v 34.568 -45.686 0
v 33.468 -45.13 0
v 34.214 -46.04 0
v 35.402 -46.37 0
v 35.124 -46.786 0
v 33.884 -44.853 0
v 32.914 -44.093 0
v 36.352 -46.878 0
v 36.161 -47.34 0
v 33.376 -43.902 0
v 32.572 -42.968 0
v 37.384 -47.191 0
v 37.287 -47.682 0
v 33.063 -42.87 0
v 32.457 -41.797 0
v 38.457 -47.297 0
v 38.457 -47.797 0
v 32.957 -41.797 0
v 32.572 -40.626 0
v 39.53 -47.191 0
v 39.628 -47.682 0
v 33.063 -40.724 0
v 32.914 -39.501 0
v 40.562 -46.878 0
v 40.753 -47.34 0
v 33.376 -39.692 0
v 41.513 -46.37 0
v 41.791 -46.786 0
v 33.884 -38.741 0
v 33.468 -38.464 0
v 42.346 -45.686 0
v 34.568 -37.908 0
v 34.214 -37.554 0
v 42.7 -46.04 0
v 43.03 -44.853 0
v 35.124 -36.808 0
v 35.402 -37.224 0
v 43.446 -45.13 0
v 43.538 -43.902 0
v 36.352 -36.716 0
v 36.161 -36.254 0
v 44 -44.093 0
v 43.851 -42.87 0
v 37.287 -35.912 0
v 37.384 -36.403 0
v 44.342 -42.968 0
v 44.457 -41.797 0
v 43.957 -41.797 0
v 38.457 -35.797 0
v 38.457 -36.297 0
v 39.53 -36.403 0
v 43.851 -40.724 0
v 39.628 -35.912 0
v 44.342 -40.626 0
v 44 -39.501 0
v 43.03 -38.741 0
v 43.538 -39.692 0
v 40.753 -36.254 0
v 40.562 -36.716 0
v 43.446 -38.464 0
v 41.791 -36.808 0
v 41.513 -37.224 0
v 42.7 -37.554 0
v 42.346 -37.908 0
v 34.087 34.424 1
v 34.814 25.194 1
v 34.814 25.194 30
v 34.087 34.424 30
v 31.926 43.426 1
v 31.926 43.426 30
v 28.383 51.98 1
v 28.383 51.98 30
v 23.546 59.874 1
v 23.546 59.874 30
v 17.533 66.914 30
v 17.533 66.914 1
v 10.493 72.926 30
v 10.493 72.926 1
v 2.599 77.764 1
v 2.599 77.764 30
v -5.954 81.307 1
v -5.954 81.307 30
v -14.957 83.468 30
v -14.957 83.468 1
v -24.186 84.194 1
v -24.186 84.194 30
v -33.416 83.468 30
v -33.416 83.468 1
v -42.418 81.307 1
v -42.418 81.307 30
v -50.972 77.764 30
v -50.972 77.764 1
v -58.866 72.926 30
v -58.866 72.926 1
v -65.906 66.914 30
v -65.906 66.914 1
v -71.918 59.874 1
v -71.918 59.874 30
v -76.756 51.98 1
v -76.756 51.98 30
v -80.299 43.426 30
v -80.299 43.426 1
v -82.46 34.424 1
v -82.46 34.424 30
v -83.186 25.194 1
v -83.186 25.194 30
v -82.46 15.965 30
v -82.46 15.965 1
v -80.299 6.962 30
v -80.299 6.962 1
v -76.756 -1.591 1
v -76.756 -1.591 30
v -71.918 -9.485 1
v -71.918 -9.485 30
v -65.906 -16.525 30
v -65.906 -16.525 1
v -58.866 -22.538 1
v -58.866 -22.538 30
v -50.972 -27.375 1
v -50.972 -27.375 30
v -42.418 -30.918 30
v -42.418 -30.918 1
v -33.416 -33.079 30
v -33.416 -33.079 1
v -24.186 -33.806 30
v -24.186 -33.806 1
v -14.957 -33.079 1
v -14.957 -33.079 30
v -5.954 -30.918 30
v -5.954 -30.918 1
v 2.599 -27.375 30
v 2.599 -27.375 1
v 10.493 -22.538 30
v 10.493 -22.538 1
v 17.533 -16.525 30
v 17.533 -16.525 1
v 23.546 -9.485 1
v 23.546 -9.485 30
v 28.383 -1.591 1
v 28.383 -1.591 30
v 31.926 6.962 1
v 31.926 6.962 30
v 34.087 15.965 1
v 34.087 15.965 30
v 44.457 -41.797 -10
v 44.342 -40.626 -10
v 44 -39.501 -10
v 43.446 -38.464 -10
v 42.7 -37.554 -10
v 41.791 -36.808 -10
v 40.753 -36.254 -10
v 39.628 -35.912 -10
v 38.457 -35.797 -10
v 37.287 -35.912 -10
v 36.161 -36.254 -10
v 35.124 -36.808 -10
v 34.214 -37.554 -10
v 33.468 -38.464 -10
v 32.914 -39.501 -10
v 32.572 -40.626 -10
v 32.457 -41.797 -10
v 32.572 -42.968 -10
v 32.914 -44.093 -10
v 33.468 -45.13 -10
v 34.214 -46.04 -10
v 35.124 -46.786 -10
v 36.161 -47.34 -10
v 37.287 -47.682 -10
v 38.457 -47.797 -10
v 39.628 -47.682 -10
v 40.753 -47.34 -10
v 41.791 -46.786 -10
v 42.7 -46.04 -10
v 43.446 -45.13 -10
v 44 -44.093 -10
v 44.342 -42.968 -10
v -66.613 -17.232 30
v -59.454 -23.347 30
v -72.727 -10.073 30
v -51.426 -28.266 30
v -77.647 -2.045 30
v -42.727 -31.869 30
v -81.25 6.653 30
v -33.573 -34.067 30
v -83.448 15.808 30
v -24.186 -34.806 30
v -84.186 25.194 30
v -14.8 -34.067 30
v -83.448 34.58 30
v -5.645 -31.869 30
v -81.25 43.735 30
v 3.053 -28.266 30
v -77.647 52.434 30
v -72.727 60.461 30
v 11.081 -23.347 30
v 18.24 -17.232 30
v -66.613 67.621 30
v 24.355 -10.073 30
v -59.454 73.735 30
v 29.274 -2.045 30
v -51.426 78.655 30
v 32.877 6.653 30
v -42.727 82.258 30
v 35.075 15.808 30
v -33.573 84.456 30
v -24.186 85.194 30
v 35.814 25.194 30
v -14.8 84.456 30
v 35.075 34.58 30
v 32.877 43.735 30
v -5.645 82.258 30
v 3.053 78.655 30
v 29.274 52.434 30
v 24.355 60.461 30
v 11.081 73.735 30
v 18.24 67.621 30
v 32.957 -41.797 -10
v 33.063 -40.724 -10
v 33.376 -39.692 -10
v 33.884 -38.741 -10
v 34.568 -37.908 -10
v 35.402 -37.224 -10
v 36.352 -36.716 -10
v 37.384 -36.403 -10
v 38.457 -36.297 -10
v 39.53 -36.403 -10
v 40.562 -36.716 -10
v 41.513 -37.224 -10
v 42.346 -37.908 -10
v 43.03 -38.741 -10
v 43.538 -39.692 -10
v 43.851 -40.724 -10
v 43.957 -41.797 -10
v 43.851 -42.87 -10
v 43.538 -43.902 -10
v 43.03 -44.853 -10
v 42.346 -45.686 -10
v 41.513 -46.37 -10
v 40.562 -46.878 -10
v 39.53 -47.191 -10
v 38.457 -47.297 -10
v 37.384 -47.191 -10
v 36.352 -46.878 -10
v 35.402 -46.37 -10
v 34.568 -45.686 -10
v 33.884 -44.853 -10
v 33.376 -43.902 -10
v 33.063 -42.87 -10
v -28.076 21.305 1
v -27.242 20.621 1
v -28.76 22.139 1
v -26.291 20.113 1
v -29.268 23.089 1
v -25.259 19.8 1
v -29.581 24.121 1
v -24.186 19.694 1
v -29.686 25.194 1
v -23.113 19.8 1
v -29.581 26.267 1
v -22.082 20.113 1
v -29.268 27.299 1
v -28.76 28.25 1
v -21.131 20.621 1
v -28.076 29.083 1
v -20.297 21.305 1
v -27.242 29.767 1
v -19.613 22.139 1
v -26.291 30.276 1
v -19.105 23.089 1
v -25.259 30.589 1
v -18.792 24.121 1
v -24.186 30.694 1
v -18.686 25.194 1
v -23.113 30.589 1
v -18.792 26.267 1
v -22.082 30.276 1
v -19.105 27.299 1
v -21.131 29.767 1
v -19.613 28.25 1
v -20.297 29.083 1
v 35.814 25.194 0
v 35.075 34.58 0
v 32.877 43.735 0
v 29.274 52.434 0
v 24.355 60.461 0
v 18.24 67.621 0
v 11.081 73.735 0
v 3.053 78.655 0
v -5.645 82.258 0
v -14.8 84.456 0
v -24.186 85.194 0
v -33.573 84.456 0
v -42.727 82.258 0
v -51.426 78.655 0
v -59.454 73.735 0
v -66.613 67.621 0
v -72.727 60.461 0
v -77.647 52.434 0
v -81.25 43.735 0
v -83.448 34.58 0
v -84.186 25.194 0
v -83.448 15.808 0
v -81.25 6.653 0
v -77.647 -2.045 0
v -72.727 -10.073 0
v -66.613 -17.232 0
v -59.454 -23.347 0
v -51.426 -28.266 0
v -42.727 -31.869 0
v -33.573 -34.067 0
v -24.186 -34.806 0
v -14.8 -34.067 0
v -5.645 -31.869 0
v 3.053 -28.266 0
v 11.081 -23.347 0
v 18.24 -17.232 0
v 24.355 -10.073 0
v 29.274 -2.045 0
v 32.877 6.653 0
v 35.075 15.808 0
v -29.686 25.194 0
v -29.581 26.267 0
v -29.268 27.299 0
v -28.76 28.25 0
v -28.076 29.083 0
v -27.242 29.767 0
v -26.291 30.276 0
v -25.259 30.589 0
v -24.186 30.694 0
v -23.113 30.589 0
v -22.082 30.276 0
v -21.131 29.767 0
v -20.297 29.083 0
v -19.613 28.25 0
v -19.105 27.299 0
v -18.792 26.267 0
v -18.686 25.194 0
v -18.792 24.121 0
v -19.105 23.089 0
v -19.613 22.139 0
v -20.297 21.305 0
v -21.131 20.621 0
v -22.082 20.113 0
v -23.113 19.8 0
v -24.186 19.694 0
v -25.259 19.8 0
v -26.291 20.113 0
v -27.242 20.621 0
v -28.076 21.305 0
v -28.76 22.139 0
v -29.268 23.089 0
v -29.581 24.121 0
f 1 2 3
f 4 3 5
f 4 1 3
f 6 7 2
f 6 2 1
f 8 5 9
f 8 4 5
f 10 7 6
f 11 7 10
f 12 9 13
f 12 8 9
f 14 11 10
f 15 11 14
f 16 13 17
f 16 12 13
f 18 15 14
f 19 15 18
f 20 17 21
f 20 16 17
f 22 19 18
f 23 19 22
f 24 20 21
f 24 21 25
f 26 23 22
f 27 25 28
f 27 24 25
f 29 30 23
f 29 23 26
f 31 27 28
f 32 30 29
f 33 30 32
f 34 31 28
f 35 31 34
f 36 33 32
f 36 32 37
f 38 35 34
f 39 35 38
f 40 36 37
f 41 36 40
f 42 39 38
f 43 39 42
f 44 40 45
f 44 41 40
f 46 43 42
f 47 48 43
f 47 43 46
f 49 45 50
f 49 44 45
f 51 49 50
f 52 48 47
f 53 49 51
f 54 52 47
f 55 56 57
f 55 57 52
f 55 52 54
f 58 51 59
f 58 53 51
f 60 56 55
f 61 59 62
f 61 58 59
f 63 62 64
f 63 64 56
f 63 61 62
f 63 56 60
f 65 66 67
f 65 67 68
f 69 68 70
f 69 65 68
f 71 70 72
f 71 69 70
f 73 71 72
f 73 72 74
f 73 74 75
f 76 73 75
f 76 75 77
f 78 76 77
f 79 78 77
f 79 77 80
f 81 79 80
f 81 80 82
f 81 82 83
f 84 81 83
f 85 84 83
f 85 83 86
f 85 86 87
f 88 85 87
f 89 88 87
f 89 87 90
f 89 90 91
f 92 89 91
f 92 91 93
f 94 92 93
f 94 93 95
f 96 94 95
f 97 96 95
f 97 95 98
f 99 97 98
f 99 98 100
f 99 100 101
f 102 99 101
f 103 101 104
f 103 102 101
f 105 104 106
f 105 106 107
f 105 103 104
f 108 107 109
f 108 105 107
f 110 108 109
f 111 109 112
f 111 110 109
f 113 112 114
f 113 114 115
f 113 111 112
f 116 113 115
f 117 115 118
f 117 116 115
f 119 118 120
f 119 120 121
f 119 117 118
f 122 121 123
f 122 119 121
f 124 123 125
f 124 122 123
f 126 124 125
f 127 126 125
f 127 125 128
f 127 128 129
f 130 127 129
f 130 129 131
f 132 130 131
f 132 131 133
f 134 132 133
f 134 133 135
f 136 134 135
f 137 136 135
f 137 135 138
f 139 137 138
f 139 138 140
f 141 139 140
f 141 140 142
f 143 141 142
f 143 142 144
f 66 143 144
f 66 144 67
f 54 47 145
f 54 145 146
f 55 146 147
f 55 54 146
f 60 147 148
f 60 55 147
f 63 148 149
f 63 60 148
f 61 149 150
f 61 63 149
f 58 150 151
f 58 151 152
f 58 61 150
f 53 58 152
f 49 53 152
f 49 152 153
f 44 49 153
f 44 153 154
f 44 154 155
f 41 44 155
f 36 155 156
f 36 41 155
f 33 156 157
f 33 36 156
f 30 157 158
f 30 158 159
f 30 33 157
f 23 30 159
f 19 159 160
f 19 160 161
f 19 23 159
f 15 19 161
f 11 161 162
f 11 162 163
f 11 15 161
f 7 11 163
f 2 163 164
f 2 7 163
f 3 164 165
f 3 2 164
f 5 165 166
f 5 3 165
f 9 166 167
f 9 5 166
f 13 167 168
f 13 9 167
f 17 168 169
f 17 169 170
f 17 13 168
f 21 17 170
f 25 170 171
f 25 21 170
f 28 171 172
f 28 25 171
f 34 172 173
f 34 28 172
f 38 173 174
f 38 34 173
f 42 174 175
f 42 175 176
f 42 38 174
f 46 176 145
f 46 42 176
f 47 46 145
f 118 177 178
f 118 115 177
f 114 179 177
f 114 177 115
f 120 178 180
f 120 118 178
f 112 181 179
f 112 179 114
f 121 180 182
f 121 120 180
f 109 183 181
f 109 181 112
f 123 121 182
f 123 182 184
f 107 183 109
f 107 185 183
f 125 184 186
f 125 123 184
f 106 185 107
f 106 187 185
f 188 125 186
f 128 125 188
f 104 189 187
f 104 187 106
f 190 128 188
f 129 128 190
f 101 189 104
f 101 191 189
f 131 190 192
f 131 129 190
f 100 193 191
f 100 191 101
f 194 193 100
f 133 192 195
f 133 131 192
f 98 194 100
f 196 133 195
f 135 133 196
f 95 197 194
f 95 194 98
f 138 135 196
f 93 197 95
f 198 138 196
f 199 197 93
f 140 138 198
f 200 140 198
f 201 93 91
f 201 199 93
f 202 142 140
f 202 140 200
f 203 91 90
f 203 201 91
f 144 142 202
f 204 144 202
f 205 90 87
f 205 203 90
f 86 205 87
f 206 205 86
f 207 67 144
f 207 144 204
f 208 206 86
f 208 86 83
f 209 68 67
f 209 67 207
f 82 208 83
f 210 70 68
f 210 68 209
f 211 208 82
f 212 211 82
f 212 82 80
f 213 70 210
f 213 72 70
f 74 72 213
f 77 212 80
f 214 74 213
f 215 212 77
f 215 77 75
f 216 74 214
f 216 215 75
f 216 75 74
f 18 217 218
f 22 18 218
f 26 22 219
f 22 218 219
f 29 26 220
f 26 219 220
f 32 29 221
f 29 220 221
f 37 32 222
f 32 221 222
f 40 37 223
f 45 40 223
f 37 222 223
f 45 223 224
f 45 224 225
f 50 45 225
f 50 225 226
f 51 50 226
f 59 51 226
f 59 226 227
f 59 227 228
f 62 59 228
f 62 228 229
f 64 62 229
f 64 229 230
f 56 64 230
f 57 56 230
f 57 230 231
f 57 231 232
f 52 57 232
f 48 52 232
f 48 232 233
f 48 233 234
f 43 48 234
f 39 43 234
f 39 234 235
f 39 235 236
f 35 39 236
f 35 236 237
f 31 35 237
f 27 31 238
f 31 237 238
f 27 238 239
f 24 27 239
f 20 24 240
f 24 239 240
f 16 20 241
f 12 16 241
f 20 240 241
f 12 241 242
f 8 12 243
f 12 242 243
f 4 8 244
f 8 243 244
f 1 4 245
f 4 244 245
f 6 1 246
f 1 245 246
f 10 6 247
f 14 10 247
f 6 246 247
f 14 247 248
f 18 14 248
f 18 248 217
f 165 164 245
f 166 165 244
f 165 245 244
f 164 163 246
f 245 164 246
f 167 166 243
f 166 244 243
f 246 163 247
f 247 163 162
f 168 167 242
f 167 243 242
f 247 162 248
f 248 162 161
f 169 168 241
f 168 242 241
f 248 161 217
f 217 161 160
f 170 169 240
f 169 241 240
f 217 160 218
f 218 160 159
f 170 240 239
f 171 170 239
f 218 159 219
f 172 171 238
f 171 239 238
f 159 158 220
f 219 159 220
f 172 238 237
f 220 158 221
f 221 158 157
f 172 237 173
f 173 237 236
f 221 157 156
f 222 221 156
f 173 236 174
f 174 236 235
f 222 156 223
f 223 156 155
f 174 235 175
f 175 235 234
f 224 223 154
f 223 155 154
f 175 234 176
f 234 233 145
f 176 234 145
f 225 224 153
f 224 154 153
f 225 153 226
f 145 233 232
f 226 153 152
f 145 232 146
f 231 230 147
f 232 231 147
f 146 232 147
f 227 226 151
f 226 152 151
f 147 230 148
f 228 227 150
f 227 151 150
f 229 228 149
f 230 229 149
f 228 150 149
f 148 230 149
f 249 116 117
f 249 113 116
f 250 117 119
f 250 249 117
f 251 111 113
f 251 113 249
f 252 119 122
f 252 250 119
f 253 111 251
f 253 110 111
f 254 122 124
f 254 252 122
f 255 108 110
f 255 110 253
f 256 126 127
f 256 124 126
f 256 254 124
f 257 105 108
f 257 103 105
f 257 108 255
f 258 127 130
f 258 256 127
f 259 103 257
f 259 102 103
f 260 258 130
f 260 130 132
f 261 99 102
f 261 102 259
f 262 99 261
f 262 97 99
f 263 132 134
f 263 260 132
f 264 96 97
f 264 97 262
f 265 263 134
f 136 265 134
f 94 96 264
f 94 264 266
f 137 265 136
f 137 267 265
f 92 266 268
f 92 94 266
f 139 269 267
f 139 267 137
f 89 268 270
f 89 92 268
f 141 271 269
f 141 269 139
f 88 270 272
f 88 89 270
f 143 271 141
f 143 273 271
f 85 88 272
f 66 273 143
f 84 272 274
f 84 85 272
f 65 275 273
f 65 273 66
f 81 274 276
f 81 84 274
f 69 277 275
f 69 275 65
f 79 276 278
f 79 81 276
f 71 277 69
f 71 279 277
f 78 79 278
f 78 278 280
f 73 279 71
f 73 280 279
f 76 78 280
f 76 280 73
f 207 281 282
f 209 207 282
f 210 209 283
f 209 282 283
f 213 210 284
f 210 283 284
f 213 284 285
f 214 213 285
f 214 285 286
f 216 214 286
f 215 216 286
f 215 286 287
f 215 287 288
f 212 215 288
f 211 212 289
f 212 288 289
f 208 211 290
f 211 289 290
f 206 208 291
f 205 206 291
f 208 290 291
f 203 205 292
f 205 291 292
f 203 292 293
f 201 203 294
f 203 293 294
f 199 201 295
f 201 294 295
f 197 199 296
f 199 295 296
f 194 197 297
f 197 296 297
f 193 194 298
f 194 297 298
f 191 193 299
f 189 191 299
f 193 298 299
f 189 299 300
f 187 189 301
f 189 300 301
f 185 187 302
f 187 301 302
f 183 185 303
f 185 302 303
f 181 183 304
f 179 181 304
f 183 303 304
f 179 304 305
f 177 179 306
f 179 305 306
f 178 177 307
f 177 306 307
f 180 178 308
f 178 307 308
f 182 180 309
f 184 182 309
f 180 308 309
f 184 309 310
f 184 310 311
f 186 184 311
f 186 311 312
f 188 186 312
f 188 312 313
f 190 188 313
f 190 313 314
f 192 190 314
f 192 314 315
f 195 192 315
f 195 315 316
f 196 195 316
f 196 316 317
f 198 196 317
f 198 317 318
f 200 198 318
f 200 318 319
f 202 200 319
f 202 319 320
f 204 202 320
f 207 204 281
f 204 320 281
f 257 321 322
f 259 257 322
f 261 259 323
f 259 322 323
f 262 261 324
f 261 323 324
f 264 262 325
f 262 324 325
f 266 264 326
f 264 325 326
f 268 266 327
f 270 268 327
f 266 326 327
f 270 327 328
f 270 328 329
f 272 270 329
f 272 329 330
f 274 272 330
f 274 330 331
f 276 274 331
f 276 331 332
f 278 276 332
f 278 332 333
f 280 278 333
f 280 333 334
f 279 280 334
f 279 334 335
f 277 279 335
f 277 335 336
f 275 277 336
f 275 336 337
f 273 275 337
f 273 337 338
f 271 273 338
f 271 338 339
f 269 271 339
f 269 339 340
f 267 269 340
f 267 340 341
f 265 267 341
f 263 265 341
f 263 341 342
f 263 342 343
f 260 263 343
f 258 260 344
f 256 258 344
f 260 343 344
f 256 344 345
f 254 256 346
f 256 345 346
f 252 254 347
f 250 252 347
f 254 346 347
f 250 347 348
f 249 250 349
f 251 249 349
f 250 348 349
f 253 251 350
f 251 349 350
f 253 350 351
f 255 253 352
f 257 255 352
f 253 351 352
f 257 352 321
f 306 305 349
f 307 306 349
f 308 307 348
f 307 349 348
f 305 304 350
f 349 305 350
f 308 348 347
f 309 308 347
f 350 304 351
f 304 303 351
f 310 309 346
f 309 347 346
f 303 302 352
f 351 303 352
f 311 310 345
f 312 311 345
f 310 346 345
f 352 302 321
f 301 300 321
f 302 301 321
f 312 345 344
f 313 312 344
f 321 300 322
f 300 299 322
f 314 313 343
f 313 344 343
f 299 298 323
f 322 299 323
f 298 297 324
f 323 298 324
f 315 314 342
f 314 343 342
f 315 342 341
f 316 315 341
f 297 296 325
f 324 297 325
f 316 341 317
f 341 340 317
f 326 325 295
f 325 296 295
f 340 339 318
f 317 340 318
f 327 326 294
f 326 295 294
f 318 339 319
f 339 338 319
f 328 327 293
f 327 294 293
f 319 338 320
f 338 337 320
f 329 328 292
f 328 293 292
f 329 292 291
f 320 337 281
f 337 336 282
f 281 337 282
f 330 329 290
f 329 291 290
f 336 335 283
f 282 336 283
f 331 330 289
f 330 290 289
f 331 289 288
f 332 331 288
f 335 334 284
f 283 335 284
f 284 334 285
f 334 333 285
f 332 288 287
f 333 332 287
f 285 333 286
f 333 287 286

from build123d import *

# Parameters (mm, degrees)
F0_R     = 60
F1_DEPTH = 30
F2_T     = -1
F4_D     = 11
F5_R     = 6
F6_DEPTH = 10
F7_D     = 11


with BuildPart() as f1:
    # F0 (on Top) → F1 (new body)
    with BuildSketch(Plane.XY):
        with Locations((-24.186473, 25.194243)):
            Circle(F0_R)
    extrude(amount=F1_DEPTH)

    # F2
    f2_openings = [f1.faces().sort_by_distance(p)[0] for p in [
        (-24.186473, 25.194243, 30),
    ]]
    offset(amount=F2_T, openings=f2_openings)

    # F4 (through all)
    with Locations(Plane.XY.offset(1)):
        with Locations((-24.186473, 25.194243)):
            Hole(F4_D / 2)


with BuildPart() as f6:
    # F5 (on Top) → F6 (new body)
    with BuildSketch(Plane.XY):
        with Locations((38.45714, -41.797038)):
            Circle(F5_R)
    extrude(amount=-F6_DEPTH)

    # F7 (through all)
    with Locations(Plane.XY):
        with Locations((38.45714, -41.797038)):
            Hole(F7_D / 2)


solid = Compound([f1.part, f6.part])
